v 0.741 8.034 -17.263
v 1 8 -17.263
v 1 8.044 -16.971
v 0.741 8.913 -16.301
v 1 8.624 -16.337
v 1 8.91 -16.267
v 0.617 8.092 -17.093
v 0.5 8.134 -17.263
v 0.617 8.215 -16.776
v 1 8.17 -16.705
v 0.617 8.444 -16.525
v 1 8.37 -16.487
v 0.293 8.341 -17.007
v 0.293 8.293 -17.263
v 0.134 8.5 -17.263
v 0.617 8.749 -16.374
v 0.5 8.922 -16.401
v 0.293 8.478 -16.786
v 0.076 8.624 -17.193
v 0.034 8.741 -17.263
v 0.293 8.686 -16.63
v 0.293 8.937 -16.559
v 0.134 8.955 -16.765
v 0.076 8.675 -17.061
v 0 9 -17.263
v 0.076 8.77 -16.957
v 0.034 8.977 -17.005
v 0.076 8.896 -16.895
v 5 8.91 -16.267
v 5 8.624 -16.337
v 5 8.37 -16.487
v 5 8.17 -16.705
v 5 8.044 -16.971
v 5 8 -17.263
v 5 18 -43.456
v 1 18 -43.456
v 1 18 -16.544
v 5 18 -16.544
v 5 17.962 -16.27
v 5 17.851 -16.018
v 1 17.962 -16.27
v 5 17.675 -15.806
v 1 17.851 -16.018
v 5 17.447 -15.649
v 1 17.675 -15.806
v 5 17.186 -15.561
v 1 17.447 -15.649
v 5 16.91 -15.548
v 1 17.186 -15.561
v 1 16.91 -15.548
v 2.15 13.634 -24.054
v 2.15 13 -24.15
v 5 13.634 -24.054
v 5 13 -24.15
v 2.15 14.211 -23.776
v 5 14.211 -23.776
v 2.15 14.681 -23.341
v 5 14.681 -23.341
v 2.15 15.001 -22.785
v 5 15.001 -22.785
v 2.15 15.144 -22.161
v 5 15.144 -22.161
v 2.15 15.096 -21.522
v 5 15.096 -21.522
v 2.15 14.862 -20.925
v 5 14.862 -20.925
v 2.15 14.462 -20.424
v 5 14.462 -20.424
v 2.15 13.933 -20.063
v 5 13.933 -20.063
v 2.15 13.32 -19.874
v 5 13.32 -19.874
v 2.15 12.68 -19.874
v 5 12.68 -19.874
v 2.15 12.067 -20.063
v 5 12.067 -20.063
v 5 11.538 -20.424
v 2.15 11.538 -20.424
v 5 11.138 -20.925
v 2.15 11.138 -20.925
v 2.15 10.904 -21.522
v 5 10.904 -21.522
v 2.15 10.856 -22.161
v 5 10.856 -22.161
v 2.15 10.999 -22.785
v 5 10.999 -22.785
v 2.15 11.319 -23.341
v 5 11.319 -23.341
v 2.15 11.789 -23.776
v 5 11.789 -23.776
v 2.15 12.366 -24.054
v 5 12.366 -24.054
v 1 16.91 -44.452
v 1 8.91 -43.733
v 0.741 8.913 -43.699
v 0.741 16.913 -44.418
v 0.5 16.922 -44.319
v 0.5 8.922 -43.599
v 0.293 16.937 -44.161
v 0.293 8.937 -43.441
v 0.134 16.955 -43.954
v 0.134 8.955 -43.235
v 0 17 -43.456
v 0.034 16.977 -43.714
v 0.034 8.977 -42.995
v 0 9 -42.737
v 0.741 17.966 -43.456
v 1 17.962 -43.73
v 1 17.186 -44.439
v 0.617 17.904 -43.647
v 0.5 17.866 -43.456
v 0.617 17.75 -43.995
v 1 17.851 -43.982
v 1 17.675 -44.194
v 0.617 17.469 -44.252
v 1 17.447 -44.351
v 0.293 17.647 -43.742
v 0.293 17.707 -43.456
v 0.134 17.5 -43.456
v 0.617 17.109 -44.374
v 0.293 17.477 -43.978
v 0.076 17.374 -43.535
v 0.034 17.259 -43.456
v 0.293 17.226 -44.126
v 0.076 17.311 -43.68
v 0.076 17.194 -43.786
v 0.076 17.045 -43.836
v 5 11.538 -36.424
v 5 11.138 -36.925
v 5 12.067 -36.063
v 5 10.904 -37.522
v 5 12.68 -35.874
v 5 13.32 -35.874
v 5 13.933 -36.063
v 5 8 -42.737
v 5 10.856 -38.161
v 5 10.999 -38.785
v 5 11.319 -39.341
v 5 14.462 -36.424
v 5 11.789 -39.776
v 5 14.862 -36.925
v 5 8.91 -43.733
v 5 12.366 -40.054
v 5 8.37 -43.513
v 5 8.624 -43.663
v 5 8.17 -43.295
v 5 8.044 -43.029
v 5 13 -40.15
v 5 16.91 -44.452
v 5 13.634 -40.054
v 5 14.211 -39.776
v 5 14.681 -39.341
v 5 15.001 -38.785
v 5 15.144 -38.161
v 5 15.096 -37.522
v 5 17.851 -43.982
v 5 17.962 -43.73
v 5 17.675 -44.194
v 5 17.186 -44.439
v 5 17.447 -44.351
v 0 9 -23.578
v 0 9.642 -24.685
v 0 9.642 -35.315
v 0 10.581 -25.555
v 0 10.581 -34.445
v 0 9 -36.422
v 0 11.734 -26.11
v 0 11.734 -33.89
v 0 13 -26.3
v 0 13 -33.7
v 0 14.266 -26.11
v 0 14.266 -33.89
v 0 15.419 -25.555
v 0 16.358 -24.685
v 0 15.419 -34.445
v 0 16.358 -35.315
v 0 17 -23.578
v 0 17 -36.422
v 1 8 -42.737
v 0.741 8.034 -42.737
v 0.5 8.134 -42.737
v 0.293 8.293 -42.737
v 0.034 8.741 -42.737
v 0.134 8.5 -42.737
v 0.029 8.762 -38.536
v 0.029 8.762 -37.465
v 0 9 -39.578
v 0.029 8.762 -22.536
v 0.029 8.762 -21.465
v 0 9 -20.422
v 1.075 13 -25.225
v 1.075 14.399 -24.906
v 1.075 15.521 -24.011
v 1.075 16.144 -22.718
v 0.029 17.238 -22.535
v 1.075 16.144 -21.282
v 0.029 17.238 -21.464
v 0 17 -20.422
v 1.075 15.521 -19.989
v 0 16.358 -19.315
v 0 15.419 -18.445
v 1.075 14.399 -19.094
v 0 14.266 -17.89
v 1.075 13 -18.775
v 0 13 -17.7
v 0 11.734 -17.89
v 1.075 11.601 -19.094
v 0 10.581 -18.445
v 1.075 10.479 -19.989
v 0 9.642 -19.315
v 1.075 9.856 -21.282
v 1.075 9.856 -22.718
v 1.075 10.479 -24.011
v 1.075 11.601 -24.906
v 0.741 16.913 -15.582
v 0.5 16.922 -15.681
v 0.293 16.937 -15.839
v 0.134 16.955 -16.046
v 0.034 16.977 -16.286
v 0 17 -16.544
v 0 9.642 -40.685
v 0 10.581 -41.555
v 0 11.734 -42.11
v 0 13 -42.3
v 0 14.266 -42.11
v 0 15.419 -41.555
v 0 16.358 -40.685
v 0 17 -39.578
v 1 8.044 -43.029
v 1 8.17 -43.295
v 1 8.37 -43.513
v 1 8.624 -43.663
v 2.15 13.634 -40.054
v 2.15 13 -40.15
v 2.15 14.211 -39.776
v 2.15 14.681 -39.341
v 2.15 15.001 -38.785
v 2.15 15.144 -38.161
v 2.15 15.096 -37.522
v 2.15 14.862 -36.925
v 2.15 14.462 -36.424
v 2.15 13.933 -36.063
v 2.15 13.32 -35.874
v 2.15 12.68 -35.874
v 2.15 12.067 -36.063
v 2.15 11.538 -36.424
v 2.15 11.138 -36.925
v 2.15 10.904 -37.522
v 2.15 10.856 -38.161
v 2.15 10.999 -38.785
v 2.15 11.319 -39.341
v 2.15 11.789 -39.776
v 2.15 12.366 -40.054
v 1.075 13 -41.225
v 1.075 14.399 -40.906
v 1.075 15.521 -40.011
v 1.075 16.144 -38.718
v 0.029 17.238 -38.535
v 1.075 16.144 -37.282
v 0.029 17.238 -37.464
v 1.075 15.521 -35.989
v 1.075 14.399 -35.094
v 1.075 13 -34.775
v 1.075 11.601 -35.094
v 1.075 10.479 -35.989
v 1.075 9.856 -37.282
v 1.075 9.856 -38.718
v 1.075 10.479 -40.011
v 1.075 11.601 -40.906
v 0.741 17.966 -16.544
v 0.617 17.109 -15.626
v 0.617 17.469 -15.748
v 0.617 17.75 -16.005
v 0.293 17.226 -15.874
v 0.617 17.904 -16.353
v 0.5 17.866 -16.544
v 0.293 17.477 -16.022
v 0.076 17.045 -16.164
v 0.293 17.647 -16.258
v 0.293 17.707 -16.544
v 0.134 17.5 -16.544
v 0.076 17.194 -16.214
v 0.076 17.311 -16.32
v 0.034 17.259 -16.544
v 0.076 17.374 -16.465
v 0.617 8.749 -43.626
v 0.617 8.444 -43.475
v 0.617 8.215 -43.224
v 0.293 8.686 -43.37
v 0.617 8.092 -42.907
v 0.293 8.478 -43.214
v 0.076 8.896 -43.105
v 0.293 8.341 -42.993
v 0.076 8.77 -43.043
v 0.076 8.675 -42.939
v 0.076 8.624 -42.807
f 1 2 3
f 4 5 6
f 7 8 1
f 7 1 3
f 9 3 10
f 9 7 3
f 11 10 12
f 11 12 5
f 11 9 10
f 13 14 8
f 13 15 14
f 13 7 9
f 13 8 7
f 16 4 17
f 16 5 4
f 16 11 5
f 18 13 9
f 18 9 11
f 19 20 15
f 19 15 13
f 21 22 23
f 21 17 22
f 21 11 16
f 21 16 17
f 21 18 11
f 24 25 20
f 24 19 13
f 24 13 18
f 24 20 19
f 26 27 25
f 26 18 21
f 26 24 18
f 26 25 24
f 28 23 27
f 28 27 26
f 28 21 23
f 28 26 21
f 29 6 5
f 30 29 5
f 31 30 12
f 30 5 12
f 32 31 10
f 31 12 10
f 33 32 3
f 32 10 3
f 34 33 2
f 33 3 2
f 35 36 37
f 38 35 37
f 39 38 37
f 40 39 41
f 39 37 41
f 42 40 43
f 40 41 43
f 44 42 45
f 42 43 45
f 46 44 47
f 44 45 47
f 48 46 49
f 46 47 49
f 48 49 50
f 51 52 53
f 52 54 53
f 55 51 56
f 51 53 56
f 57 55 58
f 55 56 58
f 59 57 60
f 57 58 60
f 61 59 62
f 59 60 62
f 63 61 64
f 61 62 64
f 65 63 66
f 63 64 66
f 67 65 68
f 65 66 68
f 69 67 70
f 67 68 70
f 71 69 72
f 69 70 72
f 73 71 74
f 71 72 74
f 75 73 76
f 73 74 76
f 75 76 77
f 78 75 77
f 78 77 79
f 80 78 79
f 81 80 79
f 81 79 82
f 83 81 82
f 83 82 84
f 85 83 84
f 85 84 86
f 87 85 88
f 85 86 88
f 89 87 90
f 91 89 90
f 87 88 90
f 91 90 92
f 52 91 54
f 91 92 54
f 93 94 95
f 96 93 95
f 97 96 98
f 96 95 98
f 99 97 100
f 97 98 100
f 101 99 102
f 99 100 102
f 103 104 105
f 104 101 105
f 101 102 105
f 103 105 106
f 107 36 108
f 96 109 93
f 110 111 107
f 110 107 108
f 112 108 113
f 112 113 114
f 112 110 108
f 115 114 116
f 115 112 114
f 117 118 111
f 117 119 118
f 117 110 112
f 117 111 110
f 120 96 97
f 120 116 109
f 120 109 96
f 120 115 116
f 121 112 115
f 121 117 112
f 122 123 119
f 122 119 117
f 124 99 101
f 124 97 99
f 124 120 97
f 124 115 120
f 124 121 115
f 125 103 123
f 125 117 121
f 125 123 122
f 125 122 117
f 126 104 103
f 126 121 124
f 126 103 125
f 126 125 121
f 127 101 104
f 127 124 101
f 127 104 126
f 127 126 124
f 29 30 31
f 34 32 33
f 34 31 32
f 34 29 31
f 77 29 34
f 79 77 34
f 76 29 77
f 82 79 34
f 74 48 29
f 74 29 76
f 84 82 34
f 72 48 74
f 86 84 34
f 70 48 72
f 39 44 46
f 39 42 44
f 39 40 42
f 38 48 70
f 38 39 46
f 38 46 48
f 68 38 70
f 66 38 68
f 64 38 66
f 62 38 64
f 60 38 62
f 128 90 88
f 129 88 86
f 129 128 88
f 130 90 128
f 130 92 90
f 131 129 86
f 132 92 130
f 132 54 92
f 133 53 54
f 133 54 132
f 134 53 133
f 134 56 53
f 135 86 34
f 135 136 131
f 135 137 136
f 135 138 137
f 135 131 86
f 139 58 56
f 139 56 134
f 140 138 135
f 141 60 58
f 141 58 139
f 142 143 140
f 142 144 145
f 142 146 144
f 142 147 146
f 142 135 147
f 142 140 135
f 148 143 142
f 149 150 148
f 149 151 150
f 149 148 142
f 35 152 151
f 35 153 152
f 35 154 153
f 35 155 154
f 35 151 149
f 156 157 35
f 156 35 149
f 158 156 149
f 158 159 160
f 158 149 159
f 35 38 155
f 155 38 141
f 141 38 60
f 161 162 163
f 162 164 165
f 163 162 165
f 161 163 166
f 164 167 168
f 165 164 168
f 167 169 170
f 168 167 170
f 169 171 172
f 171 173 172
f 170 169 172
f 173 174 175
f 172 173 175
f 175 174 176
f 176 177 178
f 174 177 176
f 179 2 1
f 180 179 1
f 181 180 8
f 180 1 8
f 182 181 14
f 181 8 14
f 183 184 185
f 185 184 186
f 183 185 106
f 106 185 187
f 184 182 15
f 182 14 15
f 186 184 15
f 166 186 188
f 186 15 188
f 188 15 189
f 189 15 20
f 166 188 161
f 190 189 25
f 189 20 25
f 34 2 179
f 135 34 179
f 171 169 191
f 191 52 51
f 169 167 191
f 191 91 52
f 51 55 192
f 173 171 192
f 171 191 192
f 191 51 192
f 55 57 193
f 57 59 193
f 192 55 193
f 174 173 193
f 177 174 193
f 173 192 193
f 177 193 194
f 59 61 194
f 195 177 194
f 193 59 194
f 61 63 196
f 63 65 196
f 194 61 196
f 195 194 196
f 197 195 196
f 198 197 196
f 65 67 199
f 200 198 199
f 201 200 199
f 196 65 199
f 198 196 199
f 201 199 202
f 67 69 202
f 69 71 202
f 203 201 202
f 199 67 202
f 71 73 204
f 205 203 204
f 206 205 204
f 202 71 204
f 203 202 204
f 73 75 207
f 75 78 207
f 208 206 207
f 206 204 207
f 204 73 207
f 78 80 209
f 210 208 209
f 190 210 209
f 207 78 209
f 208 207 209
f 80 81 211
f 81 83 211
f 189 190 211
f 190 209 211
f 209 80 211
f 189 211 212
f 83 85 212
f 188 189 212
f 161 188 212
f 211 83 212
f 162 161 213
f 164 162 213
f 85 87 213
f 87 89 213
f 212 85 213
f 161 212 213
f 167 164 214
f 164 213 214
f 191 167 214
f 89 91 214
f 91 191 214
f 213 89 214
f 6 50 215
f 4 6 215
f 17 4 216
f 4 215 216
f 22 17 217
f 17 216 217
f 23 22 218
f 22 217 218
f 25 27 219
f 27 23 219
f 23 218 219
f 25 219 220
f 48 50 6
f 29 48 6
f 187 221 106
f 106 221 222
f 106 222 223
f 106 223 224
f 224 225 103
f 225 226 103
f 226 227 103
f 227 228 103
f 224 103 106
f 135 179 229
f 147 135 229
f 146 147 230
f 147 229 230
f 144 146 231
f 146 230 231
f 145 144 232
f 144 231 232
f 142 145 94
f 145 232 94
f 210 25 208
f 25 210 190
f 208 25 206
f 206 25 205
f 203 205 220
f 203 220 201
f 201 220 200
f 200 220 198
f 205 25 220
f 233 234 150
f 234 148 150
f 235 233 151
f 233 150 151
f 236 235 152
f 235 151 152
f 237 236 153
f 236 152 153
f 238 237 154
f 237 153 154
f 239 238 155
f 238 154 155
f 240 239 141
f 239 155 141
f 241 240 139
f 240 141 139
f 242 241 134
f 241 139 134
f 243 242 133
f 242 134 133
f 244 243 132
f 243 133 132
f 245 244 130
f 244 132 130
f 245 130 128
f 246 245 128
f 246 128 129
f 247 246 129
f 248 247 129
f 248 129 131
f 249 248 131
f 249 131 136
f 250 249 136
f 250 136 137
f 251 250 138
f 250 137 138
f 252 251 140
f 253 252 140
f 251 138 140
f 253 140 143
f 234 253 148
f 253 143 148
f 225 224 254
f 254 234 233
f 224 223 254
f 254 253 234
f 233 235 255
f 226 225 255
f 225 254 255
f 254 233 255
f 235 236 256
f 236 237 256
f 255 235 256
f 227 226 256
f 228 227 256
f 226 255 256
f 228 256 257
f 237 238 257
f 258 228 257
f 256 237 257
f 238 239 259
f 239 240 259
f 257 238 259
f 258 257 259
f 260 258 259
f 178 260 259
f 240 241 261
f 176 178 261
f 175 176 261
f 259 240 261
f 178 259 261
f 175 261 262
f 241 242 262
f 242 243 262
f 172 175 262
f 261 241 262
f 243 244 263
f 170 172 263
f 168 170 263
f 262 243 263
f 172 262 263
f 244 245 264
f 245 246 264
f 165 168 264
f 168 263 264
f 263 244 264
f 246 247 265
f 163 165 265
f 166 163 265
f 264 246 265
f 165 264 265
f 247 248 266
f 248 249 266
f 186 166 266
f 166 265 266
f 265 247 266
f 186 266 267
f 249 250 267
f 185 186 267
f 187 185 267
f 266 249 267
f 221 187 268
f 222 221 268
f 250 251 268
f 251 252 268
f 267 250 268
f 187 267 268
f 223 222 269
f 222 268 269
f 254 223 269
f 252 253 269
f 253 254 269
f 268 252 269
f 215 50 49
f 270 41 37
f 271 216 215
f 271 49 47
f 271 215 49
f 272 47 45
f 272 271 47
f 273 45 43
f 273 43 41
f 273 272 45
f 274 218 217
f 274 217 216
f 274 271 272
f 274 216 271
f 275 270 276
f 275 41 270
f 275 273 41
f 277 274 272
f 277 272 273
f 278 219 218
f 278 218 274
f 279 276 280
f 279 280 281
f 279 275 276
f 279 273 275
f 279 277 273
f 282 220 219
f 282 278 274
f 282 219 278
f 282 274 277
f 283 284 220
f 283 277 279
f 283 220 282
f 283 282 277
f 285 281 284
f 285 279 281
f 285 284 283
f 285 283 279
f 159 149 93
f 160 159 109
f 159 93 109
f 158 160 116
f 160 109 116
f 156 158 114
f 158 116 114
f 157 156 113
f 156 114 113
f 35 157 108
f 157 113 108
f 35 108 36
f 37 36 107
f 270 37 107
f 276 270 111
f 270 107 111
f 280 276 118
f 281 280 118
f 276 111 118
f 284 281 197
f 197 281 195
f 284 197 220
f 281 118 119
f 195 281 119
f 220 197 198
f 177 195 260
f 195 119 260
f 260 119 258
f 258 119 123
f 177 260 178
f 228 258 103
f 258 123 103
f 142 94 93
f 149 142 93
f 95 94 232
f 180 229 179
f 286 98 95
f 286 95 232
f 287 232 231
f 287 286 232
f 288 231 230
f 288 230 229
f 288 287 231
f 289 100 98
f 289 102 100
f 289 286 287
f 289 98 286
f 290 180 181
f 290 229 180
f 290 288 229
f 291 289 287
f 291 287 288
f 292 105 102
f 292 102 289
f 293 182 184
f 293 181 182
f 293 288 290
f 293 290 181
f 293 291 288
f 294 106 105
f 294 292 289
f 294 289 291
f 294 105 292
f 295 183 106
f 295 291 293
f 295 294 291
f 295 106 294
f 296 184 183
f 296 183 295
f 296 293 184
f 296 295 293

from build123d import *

# Parameters (mm, degrees)
EXTRUDE_1_DEPTH              = 5
HOLE_WIZARD_M4_1_D           = 4.3
HOLE_WIZARD_M4_1_CSINK_D     = 8.6
HOLE_WIZARD_M4_1_CSINK_ANGLE = 90
FILLET_1_R                   = 1


with BuildPart() as part:
    # 草图1 → 凸台-拉伸1 (new body)
    with BuildSketch(Plane(origin=(0, 0, 0), x_dir=(0, 0, -1), z_dir=(1, 0, 0))):
        Polygon((22, 18), (15.44969994, 18), (16.349099819, 8), (43.650900181, 8), (44.55030006, 18), (38, 18), align=None)
    extrude(amount=EXTRUDE_1_DEPTH)

    # M4 十字槽沉头木螺钉的锥形沉头孔1 (through all)
    with Locations(Plane.ZY):
        with Locations((-38, 13), (-22, 13)):
            CounterSinkHole(HOLE_WIZARD_M4_1_D / 2, HOLE_WIZARD_M4_1_CSINK_D / 2, counter_sink_angle=HOLE_WIZARD_M4_1_CSINK_ANGLE)

    # 圆角1
    # the kernel refuses this fillet: 1 mm, written as the material it takes off along each edge
    with BuildSketch(Plane(origin=(1, 9, -17.263196285), x_dir=(0, -0.08957840876297431, 0.9959797732301061), z_dir=(-1, 0, 0))) as fillet_1_piece_1_section:
        Polygon((0, 0), (FILLET_1_R, 0), (FILLET_1_R, -FILLET_1_R * 0.914096466321), (FILLET_1_R * 0.089578408763, -FILLET_1_R * 0.99597977323), align=None)
    fillet_1_piece_1 = extrude(amount=FILLET_1_R, mode=Mode.PRIVATE)
    fillet_1_piece_1 = fillet_1_piece_1 - Plane(origin=(1, 9, -17.263196285), x_dir=(0, 0.7380983703961737, -0.6746931121765753), z_dir=(-1, 0, 0)) * Sphere(FILLET_1_R, mode=Mode.PRIVATE)
    add(fillet_1_piece_1, mode=Mode.SUBTRACT)
    with BuildSketch(Plane(origin=(1, 9, -42.736803715), x_dir=(0, -1, 0), z_dir=(-1, 0, 0))) as fillet_1_piece_2_section:
        Polygon((0, 0), (FILLET_1_R, 0), (FILLET_1_R, -FILLET_1_R * 0.914096466321), (FILLET_1_R * 0.089578408763, -FILLET_1_R * 0.99597977323), align=None)
    fillet_1_piece_2 = extrude(amount=FILLET_1_R, mode=Mode.PRIVATE)
    fillet_1_piece_2 = fillet_1_piece_2 - Plane(origin=(1, 9, -42.736803715), x_dir=(0, 0.7380983703961737, 0.6746931121765753), z_dir=(-1, 0, 0)) * Sphere(FILLET_1_R, mode=Mode.PRIVATE)
    add(fillet_1_piece_2, mode=Mode.SUBTRACT)
    with BuildSketch(Plane(origin=(1, 17, -16.543676382), x_dir=(0, -0.08957840876297431, 0.9959797732301061), z_dir=(-1, 0, 0))) as fillet_1_piece_3_section:
        Polygon((0, 0), (FILLET_1_R, 0), (FILLET_1_R, FILLET_1_R * 1.09397644214), (-FILLET_1_R * 0.089578408763, FILLET_1_R * 0.99597977323), align=None)
    fillet_1_piece_3 = extrude(amount=FILLET_1_R, mode=Mode.PRIVATE)
    fillet_1_piece_3 = fillet_1_piece_3 - Plane(origin=(1, 17, -16.543676382), x_dir=(0, -0.6746931121765753, -0.7380983703961737), z_dir=(-1, 0, 0)) * Sphere(FILLET_1_R, mode=Mode.PRIVATE)
    add(fillet_1_piece_3, mode=Mode.SUBTRACT)
    with BuildSketch(Plane(origin=(1, 17, -43.456323618), x_dir=(0, -0.08957840876297431, -0.9959797732301061), z_dir=(-1, 0, 0))) as fillet_1_piece_4_section:
        Polygon((0, 0), (FILLET_1_R, 0), (FILLET_1_R, -FILLET_1_R * 1.09397644214), (-FILLET_1_R * 0.089578408763, -FILLET_1_R * 0.99597977323), align=None)
    fillet_1_piece_4 = extrude(amount=FILLET_1_R, mode=Mode.PRIVATE)
    fillet_1_piece_4 = fillet_1_piece_4 - Plane(origin=(1, 17, -43.456323618), x_dir=(0, -0.6746931121765753, 0.7380983703961737), z_dir=(-1, 0, 0)) * Sphere(FILLET_1_R, mode=Mode.PRIVATE)
    add(fillet_1_piece_4, mode=Mode.SUBTRACT)
    with BuildSketch(Plane(origin=(0, 8, -17.263196285), x_dir=(1, 0, 0), z_dir=(0, 0, -1))) as fillet_1_piece_5:
        with BuildLine():
            CenterArc((FILLET_1_R, -FILLET_1_R), FILLET_1_R, 90, 90)
            Line((0, -FILLET_1_R), (0, 0))
            Line((0, 0), (FILLET_1_R, 0))
        make_face()
    extrude(amount=25.47360743, mode=Mode.SUBTRACT)
    with BuildSketch(Plane(origin=(0, 16.910421591, -15.547696608), x_dir=(0, 0.08957840876297431, -0.9959797732301061), z_dir=(0, -0.9959797732301061, -0.08957840876297431))) as fillet_1_piece_6:
        with BuildLine():
            CenterArc((FILLET_1_R, FILLET_1_R), FILLET_1_R, 180, 90)
            Line((0, FILLET_1_R), (0, 0))
            Line((0, 0), (FILLET_1_R, 0))
        make_face()
    extrude(amount=8.032291634, mode=Mode.SUBTRACT)
    with BuildSketch(Plane(origin=(0, 18, -43.456323618), x_dir=(1, 0, 0), z_dir=(0, 0, 1))) as fillet_1_piece_7:
        with BuildLine():
            CenterArc((FILLET_1_R, -FILLET_1_R), FILLET_1_R, 90, 90)
            Line((0, -FILLET_1_R), (0, 0))
            Line((0, 0), (FILLET_1_R, 0))
        make_face()
    extrude(amount=26.912647237, mode=Mode.SUBTRACT)
    with BuildSketch(Plane(origin=(0, 8.910421591, -43.732783488), x_dir=(1, 0, 0), z_dir=(0, 0.9959797732301061, -0.08957840876297431))) as fillet_1_piece_8:
        with BuildLine():
            CenterArc((FILLET_1_R, -FILLET_1_R), FILLET_1_R, 90, 90)
            Line((0, -FILLET_1_R), (0, 0))
            Line((0, 0), (FILLET_1_R, 0))
        make_face()
    extrude(amount=8.032291634, mode=Mode.SUBTRACT)
    with BuildSketch(Plane(origin=(1, 8, -43.650900181), x_dir=(0, 0, 1), z_dir=(1, 0, 0))) as fillet_1_piece_9:
        with BuildLine():
            CenterArc((FILLET_1_R * 0.914096466321, -FILLET_1_R), FILLET_1_R, 90, 84.860646272)
            Line((-FILLET_1_R * 0.0818833069089, -FILLET_1_R * 0.910421591237), (0, 0))
            Line((0, 0), (FILLET_1_R * 0.914096466321, 0))
        make_face()
    extrude(amount=6.285241166, mode=Mode.SUBTRACT)
    with BuildSketch(Plane(origin=(1, 8, -16.349099819), x_dir=(0, 0, -1), z_dir=(1, 0, 0))) as fillet_1_piece_10:
        with BuildLine():
            CenterArc((FILLET_1_R * 0.914096466321, FILLET_1_R), FILLET_1_R, 185.139353728, 84.860646272)
            Line((-FILLET_1_R * 0.0818833069089, FILLET_1_R * 0.910421591237), (0, 0))
            Line((0, 0), (FILLET_1_R * 0.914096466321, 0))
        make_face()
    extrude(amount=6.285241166, mode=Mode.SUBTRACT)
    with BuildSketch(Plane(origin=(1, 18, -15.44969994), x_dir=(0, 0, -1), z_dir=(1, 0, 0))) as fillet_1_piece_11:
        with BuildLine():
            CenterArc((FILLET_1_R * 1.09397644214, -FILLET_1_R), FILLET_1_R, 90, 95.139353728)
            Line((FILLET_1_R * 0.0979966689112, -FILLET_1_R * 1.08957840876), (0, 0))
            Line((0, 0), (FILLET_1_R * 1.09397644214, 0))
        make_face()
    extrude(amount=6.734941105, mode=Mode.SUBTRACT)
    with BuildSketch(Plane(origin=(1, 18, -44.55030006), x_dir=(0, 0, 1), z_dir=(1, 0, 0))) as fillet_1_piece_12:
        with BuildLine():
            CenterArc((FILLET_1_R * 1.09397644214, FILLET_1_R), FILLET_1_R, 174.860646272, 95.139353728)
            Line((FILLET_1_R * 0.0979966689112, FILLET_1_R * 1.08957840876), (0, 0))
            Line((0, 0), (FILLET_1_R * 1.09397644214, 0))
        make_face()
    extrude(amount=6.734941105, mode=Mode.SUBTRACT)


solid = part.part
